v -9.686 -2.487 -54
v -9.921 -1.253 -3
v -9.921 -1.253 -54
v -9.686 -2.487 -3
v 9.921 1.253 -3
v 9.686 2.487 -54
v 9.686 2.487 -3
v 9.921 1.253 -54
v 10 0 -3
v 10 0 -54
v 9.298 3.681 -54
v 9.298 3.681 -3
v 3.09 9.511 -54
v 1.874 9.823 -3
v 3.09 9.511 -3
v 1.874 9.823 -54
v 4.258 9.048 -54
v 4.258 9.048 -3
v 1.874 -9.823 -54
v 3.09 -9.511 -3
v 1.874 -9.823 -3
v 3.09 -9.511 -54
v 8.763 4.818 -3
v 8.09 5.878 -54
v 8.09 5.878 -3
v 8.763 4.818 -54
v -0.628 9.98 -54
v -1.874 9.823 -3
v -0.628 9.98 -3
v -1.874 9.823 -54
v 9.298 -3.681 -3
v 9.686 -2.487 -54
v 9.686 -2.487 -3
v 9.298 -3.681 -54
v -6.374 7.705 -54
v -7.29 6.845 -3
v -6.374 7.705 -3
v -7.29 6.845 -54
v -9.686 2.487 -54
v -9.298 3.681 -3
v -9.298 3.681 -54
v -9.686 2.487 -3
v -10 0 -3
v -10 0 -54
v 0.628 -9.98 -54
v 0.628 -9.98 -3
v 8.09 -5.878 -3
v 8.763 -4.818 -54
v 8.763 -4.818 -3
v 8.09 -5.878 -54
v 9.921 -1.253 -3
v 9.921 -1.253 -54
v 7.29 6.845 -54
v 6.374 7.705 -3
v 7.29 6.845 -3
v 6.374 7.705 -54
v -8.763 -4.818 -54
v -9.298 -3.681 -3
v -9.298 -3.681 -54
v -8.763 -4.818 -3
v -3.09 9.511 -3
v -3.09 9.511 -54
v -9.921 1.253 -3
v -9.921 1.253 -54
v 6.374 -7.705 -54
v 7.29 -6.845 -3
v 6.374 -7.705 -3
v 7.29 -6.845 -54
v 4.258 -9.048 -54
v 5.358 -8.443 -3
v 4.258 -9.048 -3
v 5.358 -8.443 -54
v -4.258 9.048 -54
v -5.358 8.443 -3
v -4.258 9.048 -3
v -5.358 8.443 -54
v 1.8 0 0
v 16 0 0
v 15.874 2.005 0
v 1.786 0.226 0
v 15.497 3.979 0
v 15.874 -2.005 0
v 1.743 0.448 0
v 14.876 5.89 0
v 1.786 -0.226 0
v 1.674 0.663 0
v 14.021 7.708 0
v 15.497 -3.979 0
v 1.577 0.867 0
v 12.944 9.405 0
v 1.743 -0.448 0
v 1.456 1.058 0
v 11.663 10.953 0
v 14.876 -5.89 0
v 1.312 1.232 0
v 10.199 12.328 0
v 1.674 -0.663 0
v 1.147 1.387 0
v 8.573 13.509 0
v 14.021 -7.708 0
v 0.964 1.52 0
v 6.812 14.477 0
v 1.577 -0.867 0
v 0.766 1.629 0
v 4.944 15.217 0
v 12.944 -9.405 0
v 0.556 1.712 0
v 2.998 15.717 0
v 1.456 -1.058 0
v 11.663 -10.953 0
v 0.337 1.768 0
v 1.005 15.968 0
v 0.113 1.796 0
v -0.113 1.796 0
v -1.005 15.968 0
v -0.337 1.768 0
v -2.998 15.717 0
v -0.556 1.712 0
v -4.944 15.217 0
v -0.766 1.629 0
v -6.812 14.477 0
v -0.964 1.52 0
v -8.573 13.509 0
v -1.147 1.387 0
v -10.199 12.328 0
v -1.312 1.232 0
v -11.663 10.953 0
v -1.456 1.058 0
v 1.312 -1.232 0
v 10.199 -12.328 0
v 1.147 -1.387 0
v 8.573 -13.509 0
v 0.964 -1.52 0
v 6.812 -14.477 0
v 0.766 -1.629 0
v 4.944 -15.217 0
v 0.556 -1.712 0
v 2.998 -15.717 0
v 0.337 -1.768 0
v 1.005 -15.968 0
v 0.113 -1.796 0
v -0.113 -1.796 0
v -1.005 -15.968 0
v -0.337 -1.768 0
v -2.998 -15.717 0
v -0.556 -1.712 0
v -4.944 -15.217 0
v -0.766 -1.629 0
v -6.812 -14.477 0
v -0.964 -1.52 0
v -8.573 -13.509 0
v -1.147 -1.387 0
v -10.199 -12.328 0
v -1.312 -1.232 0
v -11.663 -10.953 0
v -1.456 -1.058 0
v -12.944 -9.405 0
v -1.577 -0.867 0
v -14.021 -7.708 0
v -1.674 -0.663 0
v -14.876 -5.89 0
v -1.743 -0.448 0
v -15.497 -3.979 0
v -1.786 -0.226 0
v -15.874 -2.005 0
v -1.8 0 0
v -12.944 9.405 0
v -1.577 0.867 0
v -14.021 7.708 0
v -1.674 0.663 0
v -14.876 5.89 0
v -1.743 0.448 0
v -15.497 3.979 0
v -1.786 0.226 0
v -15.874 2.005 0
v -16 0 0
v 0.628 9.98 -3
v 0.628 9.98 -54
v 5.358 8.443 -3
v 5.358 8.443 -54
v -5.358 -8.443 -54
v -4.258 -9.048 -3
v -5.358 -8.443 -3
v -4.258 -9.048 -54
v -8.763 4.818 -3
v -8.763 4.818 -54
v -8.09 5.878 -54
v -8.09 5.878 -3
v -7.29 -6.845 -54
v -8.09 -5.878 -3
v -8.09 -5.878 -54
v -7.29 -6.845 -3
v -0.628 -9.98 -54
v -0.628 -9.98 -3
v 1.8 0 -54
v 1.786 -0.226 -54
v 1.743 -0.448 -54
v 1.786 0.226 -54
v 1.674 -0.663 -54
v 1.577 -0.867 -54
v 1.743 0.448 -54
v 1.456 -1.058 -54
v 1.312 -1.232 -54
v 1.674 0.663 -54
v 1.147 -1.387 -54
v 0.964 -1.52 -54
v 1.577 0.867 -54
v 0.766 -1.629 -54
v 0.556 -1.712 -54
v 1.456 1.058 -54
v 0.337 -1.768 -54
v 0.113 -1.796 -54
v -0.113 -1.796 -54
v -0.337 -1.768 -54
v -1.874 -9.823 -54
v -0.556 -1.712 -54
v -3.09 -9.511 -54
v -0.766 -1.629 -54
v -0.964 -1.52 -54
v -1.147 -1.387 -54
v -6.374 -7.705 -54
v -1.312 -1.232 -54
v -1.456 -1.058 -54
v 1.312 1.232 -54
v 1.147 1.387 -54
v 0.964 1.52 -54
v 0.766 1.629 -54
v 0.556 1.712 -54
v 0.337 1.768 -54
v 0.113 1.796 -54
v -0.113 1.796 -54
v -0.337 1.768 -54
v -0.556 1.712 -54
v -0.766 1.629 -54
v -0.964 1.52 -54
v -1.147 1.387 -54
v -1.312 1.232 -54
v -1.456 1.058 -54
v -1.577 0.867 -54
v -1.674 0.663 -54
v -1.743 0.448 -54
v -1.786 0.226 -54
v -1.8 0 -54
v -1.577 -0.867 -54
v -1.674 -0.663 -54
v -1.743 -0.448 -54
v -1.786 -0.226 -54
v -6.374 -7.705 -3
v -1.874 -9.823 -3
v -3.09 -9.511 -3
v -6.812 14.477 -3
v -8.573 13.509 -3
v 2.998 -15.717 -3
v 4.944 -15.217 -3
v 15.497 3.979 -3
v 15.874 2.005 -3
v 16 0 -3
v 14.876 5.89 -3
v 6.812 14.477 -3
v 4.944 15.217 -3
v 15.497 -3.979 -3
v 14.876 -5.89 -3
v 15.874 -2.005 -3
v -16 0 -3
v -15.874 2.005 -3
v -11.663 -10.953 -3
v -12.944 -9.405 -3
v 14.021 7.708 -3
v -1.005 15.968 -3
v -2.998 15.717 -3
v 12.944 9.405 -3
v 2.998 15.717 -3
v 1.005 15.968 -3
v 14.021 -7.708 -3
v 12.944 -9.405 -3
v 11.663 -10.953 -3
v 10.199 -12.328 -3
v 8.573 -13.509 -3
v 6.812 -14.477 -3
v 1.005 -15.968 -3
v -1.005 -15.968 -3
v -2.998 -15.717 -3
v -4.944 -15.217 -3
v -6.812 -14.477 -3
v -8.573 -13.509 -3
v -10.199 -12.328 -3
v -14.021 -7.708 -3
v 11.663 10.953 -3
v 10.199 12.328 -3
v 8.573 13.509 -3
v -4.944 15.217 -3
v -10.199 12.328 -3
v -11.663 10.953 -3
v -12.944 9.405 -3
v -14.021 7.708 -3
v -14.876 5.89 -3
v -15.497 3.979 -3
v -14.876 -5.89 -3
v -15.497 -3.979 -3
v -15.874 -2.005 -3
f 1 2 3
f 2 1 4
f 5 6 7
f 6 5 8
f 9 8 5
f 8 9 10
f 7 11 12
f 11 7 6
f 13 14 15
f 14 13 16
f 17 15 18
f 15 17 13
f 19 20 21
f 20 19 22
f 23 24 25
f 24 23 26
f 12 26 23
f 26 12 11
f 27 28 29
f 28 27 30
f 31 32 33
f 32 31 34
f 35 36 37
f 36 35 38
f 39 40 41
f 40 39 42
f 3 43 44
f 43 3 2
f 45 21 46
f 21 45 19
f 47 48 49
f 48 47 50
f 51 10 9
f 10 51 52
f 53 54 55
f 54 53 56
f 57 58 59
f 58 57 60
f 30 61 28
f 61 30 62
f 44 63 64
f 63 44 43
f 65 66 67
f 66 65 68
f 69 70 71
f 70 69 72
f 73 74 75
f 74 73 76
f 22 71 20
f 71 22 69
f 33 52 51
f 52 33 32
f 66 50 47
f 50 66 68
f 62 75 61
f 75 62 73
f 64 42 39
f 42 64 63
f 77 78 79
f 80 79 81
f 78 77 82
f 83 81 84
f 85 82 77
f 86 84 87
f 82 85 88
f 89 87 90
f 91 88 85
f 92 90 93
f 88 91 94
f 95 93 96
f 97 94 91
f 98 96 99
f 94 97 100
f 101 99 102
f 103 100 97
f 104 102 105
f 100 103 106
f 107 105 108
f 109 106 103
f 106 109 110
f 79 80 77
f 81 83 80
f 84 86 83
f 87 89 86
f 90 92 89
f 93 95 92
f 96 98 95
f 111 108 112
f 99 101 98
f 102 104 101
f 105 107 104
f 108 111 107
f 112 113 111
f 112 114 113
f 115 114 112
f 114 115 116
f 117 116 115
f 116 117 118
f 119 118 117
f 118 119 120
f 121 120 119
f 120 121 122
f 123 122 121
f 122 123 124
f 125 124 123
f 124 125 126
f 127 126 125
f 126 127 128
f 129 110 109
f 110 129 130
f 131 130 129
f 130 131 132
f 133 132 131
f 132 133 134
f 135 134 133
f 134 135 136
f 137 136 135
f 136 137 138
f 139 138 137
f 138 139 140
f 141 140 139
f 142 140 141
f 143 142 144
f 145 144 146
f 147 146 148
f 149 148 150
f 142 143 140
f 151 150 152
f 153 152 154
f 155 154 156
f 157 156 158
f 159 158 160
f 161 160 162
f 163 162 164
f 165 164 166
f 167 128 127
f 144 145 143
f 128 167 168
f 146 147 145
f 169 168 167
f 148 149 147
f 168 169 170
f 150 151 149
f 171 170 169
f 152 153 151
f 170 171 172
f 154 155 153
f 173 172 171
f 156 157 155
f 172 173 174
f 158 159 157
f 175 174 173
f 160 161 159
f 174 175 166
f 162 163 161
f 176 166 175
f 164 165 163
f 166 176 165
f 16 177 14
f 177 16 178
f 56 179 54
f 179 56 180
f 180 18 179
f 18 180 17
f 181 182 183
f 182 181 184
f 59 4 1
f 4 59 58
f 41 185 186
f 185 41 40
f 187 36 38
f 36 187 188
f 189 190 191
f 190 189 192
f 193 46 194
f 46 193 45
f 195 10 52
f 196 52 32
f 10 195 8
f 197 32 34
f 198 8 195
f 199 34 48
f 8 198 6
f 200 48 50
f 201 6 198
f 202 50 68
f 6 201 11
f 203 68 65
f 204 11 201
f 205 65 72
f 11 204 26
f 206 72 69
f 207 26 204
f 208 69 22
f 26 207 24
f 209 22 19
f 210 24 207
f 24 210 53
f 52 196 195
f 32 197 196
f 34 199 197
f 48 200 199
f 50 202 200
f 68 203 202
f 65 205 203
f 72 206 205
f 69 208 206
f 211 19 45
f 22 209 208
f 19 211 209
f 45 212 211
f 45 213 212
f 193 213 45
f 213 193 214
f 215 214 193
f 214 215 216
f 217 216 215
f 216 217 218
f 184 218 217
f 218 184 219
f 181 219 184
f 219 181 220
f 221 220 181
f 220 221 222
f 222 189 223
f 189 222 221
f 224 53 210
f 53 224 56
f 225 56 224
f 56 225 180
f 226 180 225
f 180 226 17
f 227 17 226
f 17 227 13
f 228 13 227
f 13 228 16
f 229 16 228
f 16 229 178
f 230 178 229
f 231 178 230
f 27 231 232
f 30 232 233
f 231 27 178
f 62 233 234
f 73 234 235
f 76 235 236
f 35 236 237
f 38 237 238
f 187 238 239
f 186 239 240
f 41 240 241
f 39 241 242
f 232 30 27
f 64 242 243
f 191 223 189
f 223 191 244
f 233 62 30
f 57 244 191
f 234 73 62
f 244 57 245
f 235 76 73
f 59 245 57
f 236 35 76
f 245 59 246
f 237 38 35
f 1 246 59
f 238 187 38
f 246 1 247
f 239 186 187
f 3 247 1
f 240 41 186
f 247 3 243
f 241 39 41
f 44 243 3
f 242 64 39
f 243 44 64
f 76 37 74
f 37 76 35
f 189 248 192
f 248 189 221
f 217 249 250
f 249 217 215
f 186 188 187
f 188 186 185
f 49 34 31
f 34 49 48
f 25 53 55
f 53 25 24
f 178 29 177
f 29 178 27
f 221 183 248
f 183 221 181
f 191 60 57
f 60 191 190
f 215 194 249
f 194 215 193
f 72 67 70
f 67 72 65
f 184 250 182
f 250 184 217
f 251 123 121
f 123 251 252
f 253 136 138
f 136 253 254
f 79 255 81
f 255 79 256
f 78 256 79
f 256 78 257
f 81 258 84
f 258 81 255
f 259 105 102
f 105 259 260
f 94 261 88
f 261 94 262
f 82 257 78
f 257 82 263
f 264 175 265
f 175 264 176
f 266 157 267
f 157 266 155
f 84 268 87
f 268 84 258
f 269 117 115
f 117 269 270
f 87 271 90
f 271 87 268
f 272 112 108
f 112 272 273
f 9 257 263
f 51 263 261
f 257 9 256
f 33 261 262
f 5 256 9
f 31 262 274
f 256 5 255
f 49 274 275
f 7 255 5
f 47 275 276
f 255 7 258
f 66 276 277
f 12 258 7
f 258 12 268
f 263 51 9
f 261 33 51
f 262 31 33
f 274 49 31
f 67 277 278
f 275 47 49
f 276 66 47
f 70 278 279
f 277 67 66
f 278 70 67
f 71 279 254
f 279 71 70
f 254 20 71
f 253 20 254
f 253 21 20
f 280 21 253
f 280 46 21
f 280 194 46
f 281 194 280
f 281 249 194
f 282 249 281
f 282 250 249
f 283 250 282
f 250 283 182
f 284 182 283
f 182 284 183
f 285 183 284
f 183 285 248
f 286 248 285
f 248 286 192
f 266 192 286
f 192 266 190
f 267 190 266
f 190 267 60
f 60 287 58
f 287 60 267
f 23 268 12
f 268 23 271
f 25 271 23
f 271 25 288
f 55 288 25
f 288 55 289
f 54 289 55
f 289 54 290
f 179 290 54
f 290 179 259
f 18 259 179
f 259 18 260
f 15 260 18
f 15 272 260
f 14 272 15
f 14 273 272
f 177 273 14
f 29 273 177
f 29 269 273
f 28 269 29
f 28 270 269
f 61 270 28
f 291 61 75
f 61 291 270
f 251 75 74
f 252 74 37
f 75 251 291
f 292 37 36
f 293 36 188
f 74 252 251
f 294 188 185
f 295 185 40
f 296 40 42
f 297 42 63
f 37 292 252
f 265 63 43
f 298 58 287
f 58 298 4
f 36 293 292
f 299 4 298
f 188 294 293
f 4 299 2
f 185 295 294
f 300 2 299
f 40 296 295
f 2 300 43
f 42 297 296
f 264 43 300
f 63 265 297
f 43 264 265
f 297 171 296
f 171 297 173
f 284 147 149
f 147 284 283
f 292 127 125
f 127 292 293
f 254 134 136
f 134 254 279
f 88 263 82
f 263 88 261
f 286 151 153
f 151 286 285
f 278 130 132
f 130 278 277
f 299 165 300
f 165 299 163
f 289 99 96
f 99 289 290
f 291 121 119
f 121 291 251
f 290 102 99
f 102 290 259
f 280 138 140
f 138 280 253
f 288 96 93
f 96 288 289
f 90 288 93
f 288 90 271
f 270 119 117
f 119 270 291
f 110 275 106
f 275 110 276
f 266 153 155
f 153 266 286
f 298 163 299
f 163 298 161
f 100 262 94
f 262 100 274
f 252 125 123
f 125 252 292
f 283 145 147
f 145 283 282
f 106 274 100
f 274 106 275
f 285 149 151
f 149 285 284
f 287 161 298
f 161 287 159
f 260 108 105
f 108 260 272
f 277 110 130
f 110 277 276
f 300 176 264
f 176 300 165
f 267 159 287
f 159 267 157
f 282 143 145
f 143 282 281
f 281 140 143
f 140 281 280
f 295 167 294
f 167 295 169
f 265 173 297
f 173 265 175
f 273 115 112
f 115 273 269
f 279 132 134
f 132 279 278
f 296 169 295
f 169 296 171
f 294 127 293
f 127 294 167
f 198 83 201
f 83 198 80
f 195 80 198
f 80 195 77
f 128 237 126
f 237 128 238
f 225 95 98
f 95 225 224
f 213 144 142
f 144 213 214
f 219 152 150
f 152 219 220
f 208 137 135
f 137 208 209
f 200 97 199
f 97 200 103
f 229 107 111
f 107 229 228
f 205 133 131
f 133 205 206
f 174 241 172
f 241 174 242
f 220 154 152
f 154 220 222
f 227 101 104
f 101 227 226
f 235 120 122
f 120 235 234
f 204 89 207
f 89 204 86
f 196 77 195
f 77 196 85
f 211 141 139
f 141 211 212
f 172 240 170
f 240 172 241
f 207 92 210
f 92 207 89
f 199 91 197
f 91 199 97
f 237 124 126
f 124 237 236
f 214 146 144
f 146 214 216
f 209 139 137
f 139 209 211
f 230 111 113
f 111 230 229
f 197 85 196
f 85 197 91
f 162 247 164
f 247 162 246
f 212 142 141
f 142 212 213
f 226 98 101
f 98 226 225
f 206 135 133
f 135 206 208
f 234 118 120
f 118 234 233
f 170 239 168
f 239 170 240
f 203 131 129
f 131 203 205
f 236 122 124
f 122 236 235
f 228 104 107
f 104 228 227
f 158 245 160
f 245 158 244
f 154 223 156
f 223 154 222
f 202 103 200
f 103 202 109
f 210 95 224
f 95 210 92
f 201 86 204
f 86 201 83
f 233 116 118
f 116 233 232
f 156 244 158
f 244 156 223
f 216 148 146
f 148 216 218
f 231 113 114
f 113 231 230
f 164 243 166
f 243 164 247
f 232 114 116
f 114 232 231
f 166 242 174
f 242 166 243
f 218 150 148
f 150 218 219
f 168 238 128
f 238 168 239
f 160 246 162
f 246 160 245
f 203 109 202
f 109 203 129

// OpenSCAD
$fn = 50;


difference() {
	union() {
		translate(v = [0, 0, -54.0000000000]) {
			cylinder(h = 54, r = 10.0000000000);
		}
		translate(v = [0, 0, -3.0000000000]) {
			cylinder(h = 3, r = 16.0000000000);
		}
	}
	union() {
		#translate(v = [0, 0, -54]) {
			cylinder(h = 54, r = 1.8000000000);
		}
	}
}
